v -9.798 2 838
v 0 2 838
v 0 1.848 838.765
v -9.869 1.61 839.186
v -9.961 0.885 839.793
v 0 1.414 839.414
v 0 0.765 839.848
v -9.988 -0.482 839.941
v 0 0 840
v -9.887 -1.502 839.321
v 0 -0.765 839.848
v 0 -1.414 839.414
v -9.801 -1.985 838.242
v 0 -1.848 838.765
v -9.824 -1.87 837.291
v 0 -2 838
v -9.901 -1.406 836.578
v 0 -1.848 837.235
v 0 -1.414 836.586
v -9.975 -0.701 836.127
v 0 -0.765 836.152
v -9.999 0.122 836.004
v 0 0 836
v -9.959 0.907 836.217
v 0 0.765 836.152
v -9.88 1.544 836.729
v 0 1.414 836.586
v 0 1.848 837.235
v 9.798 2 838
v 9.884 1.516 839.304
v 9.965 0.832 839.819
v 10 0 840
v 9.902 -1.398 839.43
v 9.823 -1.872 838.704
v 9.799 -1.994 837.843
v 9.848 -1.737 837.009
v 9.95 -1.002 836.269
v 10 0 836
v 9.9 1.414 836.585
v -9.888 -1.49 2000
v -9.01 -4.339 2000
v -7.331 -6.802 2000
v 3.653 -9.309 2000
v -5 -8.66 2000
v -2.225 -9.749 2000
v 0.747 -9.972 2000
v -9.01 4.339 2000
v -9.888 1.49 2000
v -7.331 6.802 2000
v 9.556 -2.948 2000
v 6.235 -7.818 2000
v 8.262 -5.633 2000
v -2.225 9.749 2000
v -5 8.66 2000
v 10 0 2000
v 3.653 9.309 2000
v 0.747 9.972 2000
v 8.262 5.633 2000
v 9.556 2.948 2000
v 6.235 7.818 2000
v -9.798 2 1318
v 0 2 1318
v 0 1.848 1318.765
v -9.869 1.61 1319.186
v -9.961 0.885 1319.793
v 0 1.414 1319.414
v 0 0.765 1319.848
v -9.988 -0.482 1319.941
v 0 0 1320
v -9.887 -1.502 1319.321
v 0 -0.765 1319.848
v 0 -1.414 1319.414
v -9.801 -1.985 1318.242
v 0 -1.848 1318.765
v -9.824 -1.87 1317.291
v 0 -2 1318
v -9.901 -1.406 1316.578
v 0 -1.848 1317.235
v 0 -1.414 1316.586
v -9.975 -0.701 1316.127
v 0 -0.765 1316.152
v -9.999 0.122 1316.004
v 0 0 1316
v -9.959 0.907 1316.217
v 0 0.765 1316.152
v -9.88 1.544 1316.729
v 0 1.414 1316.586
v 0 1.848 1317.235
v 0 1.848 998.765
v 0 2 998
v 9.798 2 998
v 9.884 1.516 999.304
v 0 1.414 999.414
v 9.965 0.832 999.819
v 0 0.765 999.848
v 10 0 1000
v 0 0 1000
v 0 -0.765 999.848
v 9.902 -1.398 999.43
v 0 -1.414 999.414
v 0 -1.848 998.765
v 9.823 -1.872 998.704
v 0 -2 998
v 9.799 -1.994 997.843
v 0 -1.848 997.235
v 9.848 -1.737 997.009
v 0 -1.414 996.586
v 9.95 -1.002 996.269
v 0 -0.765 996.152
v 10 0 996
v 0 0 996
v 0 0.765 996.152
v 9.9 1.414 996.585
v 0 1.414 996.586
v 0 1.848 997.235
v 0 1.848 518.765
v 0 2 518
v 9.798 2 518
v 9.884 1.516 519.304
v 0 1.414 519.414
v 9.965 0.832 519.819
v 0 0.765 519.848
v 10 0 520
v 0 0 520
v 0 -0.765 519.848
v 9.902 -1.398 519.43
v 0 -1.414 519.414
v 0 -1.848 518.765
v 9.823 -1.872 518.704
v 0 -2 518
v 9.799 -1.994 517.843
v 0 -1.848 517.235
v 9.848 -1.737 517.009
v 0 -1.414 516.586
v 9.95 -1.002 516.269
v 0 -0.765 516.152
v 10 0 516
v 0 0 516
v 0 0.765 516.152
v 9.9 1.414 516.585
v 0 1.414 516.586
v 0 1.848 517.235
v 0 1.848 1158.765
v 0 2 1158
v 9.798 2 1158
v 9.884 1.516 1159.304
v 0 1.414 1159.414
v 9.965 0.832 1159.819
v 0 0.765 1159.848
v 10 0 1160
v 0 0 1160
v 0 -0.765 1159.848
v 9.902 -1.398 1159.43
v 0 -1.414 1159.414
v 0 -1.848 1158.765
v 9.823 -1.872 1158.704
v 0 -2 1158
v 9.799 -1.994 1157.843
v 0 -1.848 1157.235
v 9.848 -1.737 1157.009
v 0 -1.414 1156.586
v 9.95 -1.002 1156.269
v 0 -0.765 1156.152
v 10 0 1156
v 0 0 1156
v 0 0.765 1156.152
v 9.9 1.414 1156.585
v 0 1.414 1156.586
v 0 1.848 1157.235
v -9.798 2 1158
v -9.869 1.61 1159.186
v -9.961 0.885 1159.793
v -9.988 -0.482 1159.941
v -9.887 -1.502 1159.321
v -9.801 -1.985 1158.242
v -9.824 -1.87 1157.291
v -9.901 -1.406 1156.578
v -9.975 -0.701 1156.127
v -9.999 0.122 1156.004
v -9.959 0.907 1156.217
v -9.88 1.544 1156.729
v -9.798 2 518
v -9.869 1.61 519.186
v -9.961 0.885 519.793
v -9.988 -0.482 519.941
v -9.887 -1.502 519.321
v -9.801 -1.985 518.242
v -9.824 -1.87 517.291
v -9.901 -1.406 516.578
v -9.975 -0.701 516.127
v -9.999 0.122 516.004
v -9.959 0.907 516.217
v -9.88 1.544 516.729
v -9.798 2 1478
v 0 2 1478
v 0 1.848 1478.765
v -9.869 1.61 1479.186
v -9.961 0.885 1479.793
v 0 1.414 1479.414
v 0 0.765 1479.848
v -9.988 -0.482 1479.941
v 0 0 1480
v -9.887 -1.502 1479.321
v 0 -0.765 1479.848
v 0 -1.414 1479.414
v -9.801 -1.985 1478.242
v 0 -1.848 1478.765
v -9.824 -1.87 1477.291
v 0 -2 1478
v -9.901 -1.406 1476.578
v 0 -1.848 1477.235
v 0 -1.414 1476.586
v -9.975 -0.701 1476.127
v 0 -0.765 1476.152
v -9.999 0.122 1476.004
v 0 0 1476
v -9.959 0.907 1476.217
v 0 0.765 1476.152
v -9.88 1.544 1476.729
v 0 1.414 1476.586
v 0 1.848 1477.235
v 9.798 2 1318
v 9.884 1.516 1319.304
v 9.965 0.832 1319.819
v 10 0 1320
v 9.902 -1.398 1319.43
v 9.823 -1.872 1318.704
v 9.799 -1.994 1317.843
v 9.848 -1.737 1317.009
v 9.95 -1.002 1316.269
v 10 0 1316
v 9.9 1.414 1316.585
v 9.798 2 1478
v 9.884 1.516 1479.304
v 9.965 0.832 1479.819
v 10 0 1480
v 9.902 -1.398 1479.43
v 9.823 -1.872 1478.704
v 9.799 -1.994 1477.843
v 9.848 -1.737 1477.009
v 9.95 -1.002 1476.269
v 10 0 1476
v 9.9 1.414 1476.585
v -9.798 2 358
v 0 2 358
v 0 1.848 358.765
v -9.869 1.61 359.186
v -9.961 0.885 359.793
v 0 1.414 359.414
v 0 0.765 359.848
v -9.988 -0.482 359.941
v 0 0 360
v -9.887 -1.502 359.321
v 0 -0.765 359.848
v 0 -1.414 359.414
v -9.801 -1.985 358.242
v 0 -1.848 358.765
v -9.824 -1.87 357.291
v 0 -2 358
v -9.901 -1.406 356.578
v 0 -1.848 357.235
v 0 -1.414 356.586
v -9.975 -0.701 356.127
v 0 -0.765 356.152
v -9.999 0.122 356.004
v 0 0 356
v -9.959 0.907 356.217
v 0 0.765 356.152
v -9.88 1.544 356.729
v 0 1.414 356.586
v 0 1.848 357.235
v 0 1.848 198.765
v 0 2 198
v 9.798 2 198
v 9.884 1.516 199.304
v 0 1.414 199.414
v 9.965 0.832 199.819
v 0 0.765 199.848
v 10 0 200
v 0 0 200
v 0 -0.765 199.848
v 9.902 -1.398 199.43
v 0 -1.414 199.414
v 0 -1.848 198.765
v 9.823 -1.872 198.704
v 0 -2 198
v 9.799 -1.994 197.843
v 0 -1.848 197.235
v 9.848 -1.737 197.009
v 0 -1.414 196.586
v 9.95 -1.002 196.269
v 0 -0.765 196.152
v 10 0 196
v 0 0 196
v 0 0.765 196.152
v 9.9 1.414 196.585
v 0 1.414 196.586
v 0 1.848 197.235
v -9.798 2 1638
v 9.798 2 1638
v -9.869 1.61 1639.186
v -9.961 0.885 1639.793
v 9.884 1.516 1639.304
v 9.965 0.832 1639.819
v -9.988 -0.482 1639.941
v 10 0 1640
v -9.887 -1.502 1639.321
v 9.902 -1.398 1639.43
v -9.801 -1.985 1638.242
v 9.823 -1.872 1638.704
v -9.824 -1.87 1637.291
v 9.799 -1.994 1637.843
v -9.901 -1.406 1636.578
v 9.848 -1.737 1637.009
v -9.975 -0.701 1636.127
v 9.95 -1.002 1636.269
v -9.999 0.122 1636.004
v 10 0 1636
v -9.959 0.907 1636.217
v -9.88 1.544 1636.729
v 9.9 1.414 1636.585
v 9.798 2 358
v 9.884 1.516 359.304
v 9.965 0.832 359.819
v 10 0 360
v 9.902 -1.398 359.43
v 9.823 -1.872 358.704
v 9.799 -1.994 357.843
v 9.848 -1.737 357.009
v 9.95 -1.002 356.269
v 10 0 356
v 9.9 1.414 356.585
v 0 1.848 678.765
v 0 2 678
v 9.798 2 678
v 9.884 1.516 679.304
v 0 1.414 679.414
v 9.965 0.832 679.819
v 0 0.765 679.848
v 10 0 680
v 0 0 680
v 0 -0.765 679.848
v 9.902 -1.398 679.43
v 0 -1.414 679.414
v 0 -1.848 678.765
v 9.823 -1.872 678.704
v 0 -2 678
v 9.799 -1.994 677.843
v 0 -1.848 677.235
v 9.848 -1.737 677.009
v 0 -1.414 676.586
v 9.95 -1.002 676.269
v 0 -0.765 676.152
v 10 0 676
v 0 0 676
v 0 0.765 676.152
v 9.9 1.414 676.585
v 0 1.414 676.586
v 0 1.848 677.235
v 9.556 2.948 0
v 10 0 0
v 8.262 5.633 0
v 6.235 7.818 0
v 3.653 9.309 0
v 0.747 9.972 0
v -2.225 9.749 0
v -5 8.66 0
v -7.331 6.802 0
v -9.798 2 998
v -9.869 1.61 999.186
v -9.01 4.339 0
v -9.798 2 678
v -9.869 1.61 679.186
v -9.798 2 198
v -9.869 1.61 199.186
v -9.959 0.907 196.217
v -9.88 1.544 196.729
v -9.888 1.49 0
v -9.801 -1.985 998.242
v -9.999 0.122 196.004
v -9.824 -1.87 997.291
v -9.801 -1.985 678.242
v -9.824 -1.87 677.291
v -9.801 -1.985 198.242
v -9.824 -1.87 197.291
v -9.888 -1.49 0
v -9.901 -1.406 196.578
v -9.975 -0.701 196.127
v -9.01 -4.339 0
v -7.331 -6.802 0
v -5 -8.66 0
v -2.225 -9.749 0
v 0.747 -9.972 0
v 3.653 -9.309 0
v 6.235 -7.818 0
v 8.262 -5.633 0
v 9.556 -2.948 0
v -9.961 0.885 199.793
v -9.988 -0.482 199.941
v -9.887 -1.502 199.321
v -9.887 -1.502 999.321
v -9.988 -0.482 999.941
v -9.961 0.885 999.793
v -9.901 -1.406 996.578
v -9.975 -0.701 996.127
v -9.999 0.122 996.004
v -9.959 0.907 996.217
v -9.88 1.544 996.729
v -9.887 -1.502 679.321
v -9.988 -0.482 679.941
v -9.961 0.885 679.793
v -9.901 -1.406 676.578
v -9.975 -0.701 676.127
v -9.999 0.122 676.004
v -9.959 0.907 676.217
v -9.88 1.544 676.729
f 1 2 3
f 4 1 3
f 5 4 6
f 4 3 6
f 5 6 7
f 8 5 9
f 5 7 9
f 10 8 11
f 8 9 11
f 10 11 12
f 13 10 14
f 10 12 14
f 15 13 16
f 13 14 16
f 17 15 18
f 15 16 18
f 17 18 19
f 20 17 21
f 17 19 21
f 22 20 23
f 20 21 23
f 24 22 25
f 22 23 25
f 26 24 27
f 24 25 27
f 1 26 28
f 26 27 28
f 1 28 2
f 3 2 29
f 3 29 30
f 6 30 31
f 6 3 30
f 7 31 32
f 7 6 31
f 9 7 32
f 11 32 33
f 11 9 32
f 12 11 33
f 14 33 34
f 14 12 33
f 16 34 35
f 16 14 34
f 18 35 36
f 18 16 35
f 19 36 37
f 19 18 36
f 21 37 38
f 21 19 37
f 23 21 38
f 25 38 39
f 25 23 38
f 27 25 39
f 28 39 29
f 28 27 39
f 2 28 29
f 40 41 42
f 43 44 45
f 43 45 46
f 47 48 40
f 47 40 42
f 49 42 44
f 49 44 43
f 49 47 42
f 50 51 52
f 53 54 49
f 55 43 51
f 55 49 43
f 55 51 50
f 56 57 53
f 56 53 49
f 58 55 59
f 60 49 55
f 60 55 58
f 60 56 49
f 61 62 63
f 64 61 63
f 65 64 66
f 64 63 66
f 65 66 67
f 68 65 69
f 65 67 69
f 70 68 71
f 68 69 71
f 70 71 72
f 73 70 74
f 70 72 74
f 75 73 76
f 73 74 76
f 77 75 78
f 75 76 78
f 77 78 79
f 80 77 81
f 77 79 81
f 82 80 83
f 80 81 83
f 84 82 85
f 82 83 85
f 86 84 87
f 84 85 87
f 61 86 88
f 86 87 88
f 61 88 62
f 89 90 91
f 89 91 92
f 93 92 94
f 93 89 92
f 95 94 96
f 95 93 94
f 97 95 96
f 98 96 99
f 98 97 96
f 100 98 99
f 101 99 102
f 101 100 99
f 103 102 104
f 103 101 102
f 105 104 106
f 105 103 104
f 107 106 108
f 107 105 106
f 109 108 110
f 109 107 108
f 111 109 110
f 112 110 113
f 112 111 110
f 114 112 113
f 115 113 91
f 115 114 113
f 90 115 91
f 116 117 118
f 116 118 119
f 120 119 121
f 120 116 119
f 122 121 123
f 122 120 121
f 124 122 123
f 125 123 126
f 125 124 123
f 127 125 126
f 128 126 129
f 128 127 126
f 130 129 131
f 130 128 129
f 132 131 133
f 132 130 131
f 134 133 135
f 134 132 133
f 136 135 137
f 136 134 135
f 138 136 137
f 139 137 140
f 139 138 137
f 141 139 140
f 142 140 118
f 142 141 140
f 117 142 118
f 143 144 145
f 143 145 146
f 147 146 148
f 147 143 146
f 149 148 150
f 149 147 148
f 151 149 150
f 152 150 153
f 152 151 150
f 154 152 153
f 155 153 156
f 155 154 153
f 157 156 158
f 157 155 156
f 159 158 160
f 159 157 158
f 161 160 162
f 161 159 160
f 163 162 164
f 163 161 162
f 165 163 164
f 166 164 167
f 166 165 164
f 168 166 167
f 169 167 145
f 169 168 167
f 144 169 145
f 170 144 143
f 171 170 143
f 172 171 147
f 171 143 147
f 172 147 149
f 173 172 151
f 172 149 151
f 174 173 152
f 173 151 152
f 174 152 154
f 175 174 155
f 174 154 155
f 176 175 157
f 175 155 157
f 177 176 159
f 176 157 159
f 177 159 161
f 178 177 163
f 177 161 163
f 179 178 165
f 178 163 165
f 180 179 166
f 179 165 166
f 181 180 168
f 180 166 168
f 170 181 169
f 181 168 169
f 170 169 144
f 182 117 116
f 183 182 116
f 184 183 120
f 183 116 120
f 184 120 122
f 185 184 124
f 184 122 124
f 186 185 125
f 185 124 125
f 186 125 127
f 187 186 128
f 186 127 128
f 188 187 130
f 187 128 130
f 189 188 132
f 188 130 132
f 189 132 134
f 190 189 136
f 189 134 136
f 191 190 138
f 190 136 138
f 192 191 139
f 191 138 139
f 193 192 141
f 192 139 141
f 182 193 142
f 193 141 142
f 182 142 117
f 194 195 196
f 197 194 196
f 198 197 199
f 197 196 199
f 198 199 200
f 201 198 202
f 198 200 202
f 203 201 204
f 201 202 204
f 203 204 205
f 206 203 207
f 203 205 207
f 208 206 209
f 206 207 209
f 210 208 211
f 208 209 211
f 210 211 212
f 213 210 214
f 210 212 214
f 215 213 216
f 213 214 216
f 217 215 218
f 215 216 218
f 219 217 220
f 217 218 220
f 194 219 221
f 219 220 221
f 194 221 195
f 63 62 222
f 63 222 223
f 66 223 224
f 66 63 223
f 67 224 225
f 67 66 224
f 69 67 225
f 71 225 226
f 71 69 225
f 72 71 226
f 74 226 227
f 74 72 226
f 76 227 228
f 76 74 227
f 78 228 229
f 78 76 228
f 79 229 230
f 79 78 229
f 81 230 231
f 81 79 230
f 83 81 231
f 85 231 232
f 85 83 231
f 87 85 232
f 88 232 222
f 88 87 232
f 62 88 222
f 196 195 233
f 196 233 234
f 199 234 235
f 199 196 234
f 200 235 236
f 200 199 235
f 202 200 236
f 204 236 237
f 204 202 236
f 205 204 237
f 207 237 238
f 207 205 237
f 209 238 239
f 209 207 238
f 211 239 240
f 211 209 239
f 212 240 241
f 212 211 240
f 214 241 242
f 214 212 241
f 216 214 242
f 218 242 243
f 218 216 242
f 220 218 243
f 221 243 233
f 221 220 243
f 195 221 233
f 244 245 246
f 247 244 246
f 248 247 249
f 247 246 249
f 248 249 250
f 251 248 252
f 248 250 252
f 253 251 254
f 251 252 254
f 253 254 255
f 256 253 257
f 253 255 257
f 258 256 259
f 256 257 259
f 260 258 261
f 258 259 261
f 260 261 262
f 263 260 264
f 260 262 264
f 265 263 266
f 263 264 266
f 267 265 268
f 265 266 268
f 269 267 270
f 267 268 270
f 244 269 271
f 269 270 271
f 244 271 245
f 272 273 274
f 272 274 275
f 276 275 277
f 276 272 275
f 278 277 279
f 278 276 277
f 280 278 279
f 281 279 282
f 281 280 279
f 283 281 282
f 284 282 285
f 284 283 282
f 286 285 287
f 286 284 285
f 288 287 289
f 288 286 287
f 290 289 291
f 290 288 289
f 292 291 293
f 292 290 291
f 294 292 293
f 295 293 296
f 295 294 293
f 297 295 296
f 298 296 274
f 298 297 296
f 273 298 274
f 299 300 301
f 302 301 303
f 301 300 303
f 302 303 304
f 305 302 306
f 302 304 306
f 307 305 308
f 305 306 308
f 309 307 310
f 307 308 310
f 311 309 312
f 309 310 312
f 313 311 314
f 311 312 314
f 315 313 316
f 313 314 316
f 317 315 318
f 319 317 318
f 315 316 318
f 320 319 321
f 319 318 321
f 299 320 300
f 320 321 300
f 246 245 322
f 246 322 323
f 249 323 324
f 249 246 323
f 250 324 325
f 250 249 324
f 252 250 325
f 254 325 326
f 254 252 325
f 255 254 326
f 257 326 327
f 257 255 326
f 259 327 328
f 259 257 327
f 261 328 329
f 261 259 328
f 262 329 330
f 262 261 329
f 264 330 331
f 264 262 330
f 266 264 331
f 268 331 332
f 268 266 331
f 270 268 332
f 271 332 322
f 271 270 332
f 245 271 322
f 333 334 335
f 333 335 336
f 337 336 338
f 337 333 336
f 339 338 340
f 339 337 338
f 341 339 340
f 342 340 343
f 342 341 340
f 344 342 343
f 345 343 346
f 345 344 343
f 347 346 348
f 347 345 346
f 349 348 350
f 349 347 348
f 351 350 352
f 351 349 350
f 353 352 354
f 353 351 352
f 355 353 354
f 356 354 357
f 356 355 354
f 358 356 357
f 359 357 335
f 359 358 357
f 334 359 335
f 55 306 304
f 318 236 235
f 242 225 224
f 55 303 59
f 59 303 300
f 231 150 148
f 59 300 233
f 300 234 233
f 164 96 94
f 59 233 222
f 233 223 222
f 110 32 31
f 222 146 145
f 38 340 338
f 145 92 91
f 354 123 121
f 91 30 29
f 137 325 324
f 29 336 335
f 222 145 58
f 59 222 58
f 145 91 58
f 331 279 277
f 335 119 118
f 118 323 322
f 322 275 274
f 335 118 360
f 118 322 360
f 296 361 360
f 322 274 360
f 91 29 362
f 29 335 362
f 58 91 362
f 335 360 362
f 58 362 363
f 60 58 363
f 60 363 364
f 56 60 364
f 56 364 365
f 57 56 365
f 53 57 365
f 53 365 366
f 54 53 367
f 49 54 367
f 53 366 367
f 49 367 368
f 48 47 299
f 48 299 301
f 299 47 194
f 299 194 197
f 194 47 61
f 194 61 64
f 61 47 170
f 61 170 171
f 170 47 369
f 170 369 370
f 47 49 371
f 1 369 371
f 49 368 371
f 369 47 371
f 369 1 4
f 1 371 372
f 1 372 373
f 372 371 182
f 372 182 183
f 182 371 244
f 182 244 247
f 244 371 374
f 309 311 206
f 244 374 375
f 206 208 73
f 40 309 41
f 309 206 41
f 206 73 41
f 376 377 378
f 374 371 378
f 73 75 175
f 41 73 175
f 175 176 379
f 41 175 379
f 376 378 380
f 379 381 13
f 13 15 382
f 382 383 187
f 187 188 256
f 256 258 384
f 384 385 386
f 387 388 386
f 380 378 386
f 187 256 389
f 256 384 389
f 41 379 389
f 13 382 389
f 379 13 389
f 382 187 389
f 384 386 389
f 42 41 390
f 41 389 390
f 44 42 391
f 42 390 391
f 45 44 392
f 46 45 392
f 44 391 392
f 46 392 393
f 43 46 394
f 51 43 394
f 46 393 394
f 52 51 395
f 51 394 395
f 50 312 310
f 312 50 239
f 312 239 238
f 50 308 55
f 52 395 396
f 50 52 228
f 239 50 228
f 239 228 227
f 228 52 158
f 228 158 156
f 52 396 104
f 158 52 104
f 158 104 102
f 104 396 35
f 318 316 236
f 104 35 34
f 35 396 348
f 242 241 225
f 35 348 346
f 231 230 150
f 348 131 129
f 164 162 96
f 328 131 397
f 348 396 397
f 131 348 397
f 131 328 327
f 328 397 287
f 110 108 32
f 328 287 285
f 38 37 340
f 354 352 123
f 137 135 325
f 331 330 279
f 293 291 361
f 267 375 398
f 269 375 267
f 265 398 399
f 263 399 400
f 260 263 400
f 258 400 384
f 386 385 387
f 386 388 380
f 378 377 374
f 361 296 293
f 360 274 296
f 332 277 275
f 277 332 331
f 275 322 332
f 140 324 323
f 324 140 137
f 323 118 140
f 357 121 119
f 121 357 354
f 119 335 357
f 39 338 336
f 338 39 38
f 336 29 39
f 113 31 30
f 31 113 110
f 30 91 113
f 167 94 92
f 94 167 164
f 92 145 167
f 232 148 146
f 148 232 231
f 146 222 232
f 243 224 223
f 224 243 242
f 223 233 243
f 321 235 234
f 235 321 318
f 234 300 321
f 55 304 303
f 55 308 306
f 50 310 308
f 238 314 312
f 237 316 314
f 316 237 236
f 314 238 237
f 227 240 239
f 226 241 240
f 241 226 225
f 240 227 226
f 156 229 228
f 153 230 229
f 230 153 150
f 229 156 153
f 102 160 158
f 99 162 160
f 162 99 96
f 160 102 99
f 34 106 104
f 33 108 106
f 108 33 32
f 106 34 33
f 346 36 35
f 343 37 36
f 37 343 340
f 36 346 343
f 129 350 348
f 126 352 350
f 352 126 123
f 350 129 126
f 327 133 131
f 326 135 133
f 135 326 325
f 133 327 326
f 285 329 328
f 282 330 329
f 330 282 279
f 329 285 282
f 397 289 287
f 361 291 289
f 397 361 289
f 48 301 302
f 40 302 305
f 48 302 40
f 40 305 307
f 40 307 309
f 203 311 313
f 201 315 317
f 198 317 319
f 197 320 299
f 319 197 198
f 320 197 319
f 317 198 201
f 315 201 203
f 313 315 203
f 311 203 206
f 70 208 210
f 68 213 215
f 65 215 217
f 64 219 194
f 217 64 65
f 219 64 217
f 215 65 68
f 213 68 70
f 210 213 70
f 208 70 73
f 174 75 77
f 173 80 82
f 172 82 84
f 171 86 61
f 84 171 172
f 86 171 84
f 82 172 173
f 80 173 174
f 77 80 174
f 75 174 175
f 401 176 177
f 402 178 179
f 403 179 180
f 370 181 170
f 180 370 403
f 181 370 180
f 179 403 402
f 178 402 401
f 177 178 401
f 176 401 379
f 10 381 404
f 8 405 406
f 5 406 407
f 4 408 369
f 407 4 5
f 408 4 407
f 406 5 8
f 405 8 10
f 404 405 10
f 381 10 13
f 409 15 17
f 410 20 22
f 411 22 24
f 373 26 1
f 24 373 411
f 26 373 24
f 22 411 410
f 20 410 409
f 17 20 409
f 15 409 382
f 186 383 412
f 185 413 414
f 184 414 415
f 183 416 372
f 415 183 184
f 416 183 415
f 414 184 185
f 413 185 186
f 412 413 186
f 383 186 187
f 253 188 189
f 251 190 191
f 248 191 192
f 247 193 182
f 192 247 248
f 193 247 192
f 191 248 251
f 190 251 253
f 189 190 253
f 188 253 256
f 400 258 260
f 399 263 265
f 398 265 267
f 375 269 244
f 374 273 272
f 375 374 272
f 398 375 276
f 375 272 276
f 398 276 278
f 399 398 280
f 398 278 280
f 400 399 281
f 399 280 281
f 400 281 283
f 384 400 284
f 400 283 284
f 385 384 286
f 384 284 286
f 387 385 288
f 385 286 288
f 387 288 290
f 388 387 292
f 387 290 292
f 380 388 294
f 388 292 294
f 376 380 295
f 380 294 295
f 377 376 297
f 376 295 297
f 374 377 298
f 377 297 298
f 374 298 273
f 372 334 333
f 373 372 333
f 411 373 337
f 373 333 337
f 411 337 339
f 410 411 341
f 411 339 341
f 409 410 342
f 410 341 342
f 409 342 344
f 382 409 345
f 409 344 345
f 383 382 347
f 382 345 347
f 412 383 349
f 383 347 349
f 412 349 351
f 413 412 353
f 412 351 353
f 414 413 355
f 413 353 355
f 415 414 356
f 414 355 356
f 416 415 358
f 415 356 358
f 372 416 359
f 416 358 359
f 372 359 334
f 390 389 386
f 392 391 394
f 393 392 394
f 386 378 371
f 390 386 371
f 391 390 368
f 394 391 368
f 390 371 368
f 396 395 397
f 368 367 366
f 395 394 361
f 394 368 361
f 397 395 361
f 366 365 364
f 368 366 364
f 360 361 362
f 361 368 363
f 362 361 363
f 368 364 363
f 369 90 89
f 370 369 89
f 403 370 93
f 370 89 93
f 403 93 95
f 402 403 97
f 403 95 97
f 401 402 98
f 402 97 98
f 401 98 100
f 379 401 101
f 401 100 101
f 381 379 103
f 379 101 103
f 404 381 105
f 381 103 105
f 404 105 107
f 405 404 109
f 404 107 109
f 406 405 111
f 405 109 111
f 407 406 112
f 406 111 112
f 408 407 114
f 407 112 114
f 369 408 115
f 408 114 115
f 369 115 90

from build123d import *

# Parameters (mm, degrees)
F0_R     = 10
F1_DEPTH = 2000
F2_R     = 2
F3_DEPTH = 12.5


with BuildPart() as f1:
    # F0 (on Top) → F1 (new body)
    with BuildSketch(Plane.XY):
        Circle(F0_R)
    extrude(amount=F1_DEPTH)

    # F2 (on Right) → F3 (cut, symmetric)
    with BuildSketch(Plane.YZ):
        with Locations((0, 198)):
            Circle(F2_R)
        with Locations((0, 358)):
            Circle(F2_R)
        with Locations((0, 518)):
            Circle(F2_R)
        with Locations((0, 678)):
            Circle(F2_R)
        with Locations((0, 838)):
            Circle(F2_R)
        with Locations((0, 998)):
            Circle(F2_R)
        with Locations((0, 1158)):
            Circle(F2_R)
        with Locations((0, 1318)):
            Circle(F2_R)
        with Locations((0, 1478)):
            Circle(F2_R)
        with Locations((0, 1638)):
            Circle(F2_R)
    extrude(amount=F3_DEPTH, both=True, mode=Mode.SUBTRACT)


solid = f1.part
